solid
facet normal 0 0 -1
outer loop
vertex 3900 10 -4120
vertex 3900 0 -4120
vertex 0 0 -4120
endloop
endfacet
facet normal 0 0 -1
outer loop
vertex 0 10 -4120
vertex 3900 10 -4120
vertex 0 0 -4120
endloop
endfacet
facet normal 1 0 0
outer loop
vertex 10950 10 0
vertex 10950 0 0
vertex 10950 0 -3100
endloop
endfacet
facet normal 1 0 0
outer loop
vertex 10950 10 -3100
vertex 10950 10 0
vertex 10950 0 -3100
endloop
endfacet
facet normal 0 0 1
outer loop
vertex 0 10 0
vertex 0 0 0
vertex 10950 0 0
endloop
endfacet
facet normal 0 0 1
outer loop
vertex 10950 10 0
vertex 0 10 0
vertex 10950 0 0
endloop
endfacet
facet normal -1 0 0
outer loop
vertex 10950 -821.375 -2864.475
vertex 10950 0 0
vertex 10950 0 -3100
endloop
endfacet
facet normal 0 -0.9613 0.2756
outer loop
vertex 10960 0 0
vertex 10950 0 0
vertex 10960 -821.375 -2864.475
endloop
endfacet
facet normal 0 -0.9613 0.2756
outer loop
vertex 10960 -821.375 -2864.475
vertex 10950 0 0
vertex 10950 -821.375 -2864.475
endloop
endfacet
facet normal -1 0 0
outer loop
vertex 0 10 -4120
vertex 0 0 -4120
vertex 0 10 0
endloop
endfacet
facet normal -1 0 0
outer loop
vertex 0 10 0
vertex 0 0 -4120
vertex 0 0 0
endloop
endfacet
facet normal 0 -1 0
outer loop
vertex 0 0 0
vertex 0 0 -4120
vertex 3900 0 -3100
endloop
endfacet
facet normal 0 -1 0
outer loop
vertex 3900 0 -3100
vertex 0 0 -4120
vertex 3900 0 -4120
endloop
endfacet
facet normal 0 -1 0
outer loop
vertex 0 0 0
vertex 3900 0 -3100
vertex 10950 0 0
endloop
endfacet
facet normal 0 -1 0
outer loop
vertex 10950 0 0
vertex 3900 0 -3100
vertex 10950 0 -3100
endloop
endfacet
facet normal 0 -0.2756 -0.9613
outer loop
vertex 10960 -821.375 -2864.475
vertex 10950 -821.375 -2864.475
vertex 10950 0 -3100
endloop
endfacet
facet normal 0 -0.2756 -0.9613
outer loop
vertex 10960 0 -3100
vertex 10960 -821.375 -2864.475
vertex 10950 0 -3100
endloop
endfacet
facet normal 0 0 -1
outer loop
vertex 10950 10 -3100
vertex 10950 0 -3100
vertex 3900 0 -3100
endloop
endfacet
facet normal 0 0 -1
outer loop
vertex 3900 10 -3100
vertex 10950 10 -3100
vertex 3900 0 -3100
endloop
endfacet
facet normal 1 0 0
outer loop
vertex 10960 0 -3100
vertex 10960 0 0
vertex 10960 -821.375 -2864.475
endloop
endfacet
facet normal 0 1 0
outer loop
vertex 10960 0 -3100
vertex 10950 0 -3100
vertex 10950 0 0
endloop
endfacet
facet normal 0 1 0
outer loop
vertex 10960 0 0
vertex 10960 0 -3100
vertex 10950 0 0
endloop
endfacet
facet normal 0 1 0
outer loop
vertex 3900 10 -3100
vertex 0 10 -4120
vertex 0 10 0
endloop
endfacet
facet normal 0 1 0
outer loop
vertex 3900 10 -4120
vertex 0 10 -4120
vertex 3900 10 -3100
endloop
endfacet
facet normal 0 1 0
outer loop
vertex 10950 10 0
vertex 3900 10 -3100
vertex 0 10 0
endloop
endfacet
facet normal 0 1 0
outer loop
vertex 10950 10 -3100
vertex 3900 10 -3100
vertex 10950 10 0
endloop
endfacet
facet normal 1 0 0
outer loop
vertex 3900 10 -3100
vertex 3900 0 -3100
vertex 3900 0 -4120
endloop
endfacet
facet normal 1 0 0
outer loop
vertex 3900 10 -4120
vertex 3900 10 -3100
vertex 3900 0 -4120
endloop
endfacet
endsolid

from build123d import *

# Parameters (mm, degrees)
EXTRUDE_1_DEPTH = 10
EXTRUDE_2_DEPTH = 10


with BuildPart() as part:
    # Эскиз1 → Бобышка-Вытянуть1 (new body)
    with BuildSketch(Plane(origin=(0, 0, 0), x_dir=(1, 0, 0), z_dir=(0, 1, 0))):
        Polygon((0, 0), (10950, 0), (10950, 3100), (3900, 3100), (3900, 4120), (0, 4120), align=None)
    extrude(amount=EXTRUDE_1_DEPTH)


with BuildPart() as body_2:
    # Эскиз2 → Бобышка-Вытянуть2 (new body)
    with BuildSketch(Plane(origin=(10950, 0, 0), x_dir=(0, 0, -1), z_dir=(1, 0, 0))):
        Polygon((0, 0), (2864.474549042, -821.374859561), (3100, 0), align=None)
    extrude(amount=EXTRUDE_2_DEPTH)


solid = Compound([part.part, body_2.part])
